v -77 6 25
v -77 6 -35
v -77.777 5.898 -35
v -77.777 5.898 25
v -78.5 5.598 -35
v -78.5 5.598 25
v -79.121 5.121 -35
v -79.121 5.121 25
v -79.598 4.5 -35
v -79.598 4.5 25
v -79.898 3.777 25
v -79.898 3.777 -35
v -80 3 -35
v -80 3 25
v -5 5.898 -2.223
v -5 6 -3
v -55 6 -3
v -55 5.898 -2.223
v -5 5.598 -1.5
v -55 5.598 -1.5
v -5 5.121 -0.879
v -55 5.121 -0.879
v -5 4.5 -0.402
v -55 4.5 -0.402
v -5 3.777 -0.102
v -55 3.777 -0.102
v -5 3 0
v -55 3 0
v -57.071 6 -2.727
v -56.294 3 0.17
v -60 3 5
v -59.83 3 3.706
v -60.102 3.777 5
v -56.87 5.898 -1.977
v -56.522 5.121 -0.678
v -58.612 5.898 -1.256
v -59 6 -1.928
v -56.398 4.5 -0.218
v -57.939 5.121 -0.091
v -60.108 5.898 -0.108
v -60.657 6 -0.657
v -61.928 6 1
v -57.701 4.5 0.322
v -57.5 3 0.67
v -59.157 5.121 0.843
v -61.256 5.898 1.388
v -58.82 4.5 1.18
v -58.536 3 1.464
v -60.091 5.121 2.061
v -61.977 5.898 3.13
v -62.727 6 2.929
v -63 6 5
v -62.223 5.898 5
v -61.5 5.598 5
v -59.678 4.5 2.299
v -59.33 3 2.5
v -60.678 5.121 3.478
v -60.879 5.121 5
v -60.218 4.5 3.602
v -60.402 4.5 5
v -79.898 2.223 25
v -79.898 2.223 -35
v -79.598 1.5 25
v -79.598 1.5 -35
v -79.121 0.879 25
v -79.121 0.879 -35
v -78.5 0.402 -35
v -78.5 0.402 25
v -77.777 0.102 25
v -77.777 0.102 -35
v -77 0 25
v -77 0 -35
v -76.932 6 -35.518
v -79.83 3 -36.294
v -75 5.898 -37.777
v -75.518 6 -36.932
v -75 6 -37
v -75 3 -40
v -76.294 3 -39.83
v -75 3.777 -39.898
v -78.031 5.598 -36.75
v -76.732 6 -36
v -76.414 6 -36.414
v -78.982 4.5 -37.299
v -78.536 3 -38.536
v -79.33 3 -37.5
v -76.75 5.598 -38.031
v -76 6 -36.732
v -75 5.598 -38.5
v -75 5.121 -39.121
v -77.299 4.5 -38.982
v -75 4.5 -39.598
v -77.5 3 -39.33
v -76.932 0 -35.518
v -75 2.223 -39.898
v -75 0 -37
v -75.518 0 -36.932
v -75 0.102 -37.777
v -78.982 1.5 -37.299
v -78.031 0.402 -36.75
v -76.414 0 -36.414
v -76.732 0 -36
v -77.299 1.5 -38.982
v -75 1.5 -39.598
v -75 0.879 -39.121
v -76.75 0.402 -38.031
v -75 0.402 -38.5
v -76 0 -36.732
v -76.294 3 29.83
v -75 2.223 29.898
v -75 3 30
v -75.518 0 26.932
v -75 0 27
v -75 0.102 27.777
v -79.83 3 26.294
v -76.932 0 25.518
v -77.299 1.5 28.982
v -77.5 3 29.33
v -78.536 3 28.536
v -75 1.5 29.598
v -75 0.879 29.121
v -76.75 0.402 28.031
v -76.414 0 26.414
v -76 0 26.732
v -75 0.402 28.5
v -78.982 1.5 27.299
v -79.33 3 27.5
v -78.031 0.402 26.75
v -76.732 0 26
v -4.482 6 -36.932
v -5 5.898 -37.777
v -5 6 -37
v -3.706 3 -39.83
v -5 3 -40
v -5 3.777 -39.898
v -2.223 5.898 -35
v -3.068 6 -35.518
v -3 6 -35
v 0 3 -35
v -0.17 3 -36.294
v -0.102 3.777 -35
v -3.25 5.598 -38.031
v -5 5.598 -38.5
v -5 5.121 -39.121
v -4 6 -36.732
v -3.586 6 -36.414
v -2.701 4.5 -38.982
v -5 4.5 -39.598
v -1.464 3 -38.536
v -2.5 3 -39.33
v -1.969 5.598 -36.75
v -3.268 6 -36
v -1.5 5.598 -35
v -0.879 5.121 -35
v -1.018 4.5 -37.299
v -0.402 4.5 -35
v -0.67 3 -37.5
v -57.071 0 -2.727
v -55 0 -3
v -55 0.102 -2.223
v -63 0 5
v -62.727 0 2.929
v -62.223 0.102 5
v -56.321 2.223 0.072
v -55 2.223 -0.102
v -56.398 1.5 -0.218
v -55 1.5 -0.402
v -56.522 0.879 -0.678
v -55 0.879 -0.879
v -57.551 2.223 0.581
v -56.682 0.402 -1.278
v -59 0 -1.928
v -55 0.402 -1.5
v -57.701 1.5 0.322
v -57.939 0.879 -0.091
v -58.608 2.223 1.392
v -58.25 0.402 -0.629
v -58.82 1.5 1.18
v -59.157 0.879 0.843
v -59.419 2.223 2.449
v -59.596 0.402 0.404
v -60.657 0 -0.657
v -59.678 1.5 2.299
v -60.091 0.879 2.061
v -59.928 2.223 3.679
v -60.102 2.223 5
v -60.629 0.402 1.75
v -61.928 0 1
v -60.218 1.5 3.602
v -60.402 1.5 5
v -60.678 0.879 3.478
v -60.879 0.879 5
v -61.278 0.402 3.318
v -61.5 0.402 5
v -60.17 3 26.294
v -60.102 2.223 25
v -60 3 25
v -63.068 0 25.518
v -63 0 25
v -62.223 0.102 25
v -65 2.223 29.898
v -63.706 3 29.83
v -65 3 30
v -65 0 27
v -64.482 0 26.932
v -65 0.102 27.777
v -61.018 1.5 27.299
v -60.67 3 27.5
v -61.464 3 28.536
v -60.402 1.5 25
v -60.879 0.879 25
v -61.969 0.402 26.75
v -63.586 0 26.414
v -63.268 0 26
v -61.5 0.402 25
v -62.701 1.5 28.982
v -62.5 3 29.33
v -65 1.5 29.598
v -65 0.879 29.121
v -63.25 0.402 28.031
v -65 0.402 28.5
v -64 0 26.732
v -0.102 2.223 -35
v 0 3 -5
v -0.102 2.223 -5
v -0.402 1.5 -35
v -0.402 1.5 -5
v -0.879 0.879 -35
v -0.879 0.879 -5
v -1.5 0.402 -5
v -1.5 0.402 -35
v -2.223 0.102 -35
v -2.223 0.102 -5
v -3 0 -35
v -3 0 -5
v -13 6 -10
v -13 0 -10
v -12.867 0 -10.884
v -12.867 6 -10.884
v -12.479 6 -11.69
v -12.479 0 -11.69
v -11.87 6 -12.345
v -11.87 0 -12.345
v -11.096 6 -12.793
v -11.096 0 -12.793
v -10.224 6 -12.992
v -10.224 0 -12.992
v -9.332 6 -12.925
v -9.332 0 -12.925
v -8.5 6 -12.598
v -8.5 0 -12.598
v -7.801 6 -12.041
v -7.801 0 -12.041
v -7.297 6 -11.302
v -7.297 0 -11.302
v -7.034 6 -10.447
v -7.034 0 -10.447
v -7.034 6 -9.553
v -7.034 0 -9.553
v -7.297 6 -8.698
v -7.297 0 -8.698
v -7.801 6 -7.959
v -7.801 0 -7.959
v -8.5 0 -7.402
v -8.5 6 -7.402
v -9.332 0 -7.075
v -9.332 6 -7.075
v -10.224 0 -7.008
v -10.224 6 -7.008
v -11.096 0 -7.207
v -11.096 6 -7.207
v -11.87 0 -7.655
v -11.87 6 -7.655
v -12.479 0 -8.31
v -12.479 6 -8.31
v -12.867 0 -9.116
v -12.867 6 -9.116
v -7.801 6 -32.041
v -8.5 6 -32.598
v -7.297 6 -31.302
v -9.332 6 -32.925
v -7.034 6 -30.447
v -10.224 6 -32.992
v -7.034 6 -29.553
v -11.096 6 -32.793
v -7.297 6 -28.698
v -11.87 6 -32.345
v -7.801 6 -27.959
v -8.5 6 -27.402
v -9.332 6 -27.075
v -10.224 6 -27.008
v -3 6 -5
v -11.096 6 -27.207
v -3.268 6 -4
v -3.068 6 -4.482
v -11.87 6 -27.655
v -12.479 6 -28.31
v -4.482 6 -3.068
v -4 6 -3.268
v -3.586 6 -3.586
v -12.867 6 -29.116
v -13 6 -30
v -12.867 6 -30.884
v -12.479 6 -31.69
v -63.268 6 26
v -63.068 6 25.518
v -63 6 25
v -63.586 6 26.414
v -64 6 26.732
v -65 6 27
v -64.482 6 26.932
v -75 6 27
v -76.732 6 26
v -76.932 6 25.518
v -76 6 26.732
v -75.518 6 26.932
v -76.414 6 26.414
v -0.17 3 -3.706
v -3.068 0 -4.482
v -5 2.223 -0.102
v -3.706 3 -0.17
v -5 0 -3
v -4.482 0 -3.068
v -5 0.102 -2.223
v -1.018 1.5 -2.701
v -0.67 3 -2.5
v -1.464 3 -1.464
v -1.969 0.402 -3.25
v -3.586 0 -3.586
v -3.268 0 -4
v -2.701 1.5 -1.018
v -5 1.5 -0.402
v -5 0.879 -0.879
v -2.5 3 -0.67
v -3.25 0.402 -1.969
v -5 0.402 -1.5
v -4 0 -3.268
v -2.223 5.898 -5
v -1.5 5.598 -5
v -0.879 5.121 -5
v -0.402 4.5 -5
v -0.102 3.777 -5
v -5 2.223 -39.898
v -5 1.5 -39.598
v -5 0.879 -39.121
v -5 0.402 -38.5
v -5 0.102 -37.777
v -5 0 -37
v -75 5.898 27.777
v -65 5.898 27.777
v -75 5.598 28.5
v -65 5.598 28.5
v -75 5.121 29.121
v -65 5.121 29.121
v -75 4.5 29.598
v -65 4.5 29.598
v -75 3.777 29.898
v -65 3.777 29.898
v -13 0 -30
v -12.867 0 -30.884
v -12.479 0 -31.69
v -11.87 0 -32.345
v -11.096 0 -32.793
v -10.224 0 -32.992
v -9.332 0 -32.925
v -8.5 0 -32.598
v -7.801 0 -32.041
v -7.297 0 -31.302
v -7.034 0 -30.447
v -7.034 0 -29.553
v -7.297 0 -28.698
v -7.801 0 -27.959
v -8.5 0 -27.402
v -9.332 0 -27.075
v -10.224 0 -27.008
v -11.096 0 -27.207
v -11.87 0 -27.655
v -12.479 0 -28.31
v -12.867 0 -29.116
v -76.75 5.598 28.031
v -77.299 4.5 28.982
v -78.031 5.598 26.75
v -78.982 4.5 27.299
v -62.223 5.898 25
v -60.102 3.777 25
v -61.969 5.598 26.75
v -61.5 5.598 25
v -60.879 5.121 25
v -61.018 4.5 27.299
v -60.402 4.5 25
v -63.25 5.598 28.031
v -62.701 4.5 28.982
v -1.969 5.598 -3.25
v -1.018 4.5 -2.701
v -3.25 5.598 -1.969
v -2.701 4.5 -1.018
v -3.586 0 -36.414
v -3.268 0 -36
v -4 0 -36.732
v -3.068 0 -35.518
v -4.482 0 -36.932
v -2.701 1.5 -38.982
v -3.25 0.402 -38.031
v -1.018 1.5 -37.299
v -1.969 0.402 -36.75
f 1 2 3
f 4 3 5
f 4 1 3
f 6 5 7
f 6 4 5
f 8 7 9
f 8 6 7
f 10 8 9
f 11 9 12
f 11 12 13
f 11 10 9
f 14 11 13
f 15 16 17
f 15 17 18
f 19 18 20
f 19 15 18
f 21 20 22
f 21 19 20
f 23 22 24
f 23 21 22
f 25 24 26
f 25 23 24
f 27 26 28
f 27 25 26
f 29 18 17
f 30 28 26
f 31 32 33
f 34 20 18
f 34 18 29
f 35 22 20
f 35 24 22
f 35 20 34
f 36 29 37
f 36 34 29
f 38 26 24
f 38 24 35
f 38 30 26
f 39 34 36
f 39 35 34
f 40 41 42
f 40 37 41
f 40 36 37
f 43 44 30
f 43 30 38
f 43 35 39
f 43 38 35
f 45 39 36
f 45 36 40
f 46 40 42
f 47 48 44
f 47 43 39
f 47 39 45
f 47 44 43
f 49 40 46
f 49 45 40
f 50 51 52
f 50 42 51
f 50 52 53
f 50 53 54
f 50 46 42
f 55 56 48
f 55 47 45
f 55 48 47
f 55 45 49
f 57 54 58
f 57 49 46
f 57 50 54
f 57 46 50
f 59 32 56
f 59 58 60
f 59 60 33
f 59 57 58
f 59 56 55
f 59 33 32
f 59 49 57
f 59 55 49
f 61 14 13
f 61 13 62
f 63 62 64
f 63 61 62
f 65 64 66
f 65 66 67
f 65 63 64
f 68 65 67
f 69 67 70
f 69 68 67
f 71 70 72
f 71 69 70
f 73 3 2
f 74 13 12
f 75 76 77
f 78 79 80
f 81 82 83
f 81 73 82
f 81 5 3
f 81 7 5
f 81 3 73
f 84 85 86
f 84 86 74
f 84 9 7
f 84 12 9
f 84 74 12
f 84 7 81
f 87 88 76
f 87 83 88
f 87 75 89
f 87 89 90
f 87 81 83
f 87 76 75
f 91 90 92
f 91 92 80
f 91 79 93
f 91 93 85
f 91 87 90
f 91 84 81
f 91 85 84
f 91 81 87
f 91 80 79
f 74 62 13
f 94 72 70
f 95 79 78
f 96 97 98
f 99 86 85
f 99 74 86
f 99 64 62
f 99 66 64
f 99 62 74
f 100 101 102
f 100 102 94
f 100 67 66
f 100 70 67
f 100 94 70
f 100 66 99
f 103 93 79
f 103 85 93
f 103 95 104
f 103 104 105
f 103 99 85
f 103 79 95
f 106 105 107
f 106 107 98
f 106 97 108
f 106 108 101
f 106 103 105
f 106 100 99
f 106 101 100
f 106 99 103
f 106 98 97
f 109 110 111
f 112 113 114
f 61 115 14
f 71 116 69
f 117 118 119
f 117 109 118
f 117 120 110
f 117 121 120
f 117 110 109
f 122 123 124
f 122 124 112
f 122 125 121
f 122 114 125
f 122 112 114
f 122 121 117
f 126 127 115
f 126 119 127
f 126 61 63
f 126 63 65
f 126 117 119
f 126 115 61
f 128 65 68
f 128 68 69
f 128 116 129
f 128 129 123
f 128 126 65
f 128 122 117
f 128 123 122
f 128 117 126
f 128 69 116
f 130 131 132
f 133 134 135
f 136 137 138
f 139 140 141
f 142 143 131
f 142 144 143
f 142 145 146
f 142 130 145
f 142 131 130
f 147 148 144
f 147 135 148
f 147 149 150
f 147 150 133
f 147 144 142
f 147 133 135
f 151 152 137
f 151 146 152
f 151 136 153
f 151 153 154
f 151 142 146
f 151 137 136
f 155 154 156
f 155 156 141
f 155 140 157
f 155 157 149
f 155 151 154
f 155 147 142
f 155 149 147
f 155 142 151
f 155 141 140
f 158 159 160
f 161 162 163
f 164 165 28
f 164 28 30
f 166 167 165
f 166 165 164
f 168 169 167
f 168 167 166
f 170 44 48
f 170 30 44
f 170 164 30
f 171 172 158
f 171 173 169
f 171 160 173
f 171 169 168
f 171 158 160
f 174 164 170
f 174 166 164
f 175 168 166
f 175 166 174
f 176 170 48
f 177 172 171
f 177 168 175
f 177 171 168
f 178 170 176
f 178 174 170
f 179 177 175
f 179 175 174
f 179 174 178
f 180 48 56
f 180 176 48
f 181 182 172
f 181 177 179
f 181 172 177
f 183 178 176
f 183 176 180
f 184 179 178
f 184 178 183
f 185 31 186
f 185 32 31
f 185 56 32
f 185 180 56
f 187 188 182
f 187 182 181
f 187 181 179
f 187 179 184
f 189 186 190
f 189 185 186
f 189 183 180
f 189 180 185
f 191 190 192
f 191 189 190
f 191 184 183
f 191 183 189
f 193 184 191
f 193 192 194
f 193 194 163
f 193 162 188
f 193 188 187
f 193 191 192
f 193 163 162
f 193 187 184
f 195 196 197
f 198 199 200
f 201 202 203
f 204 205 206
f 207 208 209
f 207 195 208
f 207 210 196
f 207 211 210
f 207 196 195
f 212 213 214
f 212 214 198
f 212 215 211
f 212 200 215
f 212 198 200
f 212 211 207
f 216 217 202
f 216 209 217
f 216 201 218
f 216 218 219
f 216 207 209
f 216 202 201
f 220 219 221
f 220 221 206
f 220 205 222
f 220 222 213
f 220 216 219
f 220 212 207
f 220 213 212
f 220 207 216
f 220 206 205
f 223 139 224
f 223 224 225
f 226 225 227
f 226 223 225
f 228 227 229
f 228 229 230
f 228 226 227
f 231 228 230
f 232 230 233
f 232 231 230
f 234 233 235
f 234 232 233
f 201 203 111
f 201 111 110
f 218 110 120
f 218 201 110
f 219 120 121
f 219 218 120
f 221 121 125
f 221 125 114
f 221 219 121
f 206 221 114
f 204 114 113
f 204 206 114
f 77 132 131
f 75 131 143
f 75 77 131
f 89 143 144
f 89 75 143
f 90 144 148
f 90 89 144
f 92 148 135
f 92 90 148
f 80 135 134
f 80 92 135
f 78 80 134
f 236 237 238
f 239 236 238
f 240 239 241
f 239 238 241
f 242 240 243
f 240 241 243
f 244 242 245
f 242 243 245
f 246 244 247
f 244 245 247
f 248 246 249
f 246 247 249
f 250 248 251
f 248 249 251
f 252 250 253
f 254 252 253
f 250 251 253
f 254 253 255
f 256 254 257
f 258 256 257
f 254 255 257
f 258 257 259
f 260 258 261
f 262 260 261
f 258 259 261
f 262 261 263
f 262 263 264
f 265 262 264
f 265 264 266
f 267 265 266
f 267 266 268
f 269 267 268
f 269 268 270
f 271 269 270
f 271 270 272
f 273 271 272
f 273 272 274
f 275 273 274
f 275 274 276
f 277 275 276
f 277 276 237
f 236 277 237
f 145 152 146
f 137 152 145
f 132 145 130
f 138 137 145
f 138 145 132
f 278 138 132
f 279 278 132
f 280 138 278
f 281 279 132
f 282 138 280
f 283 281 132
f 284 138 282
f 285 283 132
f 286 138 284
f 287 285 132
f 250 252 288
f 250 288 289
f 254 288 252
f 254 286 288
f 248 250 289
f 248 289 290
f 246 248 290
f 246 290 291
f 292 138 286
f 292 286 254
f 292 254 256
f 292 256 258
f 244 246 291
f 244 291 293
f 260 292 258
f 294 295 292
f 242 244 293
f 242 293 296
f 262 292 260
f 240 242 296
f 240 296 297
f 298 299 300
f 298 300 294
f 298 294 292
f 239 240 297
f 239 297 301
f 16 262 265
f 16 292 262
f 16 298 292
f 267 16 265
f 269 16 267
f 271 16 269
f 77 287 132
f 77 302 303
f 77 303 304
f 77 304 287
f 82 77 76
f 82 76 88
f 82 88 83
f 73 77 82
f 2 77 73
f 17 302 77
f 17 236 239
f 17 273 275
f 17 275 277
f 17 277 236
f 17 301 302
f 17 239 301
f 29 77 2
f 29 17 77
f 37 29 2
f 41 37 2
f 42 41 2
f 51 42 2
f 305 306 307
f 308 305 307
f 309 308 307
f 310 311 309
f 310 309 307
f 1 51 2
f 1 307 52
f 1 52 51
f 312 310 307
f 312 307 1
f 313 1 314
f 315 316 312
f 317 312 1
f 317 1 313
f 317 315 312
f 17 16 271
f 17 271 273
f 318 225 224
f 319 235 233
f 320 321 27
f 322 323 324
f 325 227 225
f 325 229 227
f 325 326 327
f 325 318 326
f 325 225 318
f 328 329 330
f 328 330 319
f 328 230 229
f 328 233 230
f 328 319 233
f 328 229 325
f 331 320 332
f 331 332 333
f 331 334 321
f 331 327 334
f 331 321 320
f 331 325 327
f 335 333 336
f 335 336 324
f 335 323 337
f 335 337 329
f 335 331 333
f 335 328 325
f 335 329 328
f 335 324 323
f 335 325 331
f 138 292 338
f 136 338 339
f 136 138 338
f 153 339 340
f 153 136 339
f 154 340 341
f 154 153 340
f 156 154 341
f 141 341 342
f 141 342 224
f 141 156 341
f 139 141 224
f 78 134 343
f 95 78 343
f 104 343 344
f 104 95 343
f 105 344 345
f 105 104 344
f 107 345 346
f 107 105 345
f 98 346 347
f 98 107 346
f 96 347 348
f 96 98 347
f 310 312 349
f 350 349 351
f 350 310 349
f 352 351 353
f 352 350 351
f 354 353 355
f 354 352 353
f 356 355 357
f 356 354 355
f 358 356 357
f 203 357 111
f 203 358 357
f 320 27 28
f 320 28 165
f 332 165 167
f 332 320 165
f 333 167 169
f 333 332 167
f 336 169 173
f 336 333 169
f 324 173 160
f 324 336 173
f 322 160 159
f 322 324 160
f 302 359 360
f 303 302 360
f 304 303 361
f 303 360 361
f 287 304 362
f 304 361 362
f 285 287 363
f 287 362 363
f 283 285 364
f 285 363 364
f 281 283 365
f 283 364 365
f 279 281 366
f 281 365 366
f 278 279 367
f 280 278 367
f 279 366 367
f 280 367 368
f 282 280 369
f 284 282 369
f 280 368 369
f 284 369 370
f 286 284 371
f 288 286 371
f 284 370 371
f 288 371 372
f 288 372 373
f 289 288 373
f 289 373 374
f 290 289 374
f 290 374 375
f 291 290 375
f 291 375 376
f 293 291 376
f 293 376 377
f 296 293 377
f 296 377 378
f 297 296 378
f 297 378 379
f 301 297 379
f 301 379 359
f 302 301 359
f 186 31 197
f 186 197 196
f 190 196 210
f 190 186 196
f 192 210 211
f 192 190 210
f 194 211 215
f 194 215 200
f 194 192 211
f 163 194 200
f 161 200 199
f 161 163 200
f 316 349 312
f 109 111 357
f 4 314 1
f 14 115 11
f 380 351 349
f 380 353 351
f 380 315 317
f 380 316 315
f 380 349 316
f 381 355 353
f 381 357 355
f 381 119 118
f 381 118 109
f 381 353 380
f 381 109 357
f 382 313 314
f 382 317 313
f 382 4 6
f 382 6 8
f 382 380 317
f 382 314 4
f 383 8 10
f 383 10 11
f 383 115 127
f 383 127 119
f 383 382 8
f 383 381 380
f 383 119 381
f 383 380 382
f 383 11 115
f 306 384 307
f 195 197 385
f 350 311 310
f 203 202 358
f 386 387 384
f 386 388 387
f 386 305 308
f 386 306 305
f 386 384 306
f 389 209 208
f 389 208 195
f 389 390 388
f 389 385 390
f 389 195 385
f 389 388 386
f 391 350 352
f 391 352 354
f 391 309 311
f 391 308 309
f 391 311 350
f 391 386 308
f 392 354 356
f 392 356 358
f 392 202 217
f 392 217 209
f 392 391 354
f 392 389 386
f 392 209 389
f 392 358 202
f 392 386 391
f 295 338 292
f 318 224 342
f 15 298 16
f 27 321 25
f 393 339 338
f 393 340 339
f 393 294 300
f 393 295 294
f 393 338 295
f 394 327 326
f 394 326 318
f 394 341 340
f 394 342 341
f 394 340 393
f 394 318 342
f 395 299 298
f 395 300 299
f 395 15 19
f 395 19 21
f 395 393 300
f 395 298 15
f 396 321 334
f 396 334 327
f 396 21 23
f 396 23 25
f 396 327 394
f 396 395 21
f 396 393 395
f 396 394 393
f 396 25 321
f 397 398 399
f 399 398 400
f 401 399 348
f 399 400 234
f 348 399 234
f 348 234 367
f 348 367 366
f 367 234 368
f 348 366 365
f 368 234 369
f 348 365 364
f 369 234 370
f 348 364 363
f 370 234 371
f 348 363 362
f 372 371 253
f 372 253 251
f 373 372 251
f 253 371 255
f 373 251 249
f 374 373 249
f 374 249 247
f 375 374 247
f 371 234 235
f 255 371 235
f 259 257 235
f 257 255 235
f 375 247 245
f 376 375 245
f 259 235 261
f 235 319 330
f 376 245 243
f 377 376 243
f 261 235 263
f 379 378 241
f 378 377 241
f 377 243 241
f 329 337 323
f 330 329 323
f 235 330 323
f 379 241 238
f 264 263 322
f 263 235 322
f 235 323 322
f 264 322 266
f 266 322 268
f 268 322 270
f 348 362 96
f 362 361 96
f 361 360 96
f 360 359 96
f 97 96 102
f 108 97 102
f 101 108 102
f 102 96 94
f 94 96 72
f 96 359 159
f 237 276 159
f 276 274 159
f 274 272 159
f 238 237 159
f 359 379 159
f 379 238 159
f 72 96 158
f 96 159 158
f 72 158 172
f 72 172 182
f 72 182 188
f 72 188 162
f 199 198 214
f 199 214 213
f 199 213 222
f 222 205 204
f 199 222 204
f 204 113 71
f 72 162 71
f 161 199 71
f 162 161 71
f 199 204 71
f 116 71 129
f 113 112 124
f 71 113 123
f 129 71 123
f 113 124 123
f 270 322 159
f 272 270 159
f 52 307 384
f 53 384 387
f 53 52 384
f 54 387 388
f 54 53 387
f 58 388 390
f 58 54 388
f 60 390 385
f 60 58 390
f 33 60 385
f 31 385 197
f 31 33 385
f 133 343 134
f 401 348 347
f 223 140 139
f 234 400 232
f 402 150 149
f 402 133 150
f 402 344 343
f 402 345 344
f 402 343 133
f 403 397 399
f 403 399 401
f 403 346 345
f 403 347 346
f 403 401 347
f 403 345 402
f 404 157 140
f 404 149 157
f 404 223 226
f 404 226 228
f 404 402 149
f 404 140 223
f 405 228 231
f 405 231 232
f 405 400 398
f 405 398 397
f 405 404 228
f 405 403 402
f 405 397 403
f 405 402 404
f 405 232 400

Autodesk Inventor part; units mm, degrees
ref_plane "YZ Plane" through (0, 0, 0) normal (1, 0, 0) x (0, 1, 0)
ref_plane "XZ Plane" through (0, 0, 0) normal (0, 1, 0) x (-1, 0, 0)
ref_plane "XY Plane" through (0, 0, 0) normal (0, 0, 1) x (1, 0, 0)
sketch "Sketch1" plane through (0, 0, 0) normal (0, 1, 0) x (-1, 0, 0)
  line L0 (0, 0) -> (80, 0)
  line L1 (80, 0) -> (80, -40)
  line L2 (80, -40) -> (0, -40)
  line L3 (0, -40) -> (0, 0)
  line L4 (0, 0) -> (10, 0)
  line L5 (10, 0) -> (10, -10)
  line L6 (10, -10) -> (10, -30)
  circle A0 centre (10, -10) radius 3
  circle A1 centre (10, -30) radius 3
  line L7 (80, 0) -> (60, 0)
  line L8 (60, 0) -> (60, 30)
  line L9 (60, 30) -> (80, 30)
  line L10 (80, 30) -> (80, 0)
  dimension "d0" = 80
  dimension "d1" = 40
  dimension "d2" = 10
  dimension "d3" = 10
  dimension "d4" = 20
  dimension "d5" = 6
  dimension "d6" = 6
  dimension "d28" = 20
  dimension "d29" = 30
extrude "Extrusion1" add sketch "Sketch1" along normal blind 6
fillet "Fillet5" radius 5 6 edges at (-60, 3, 0) (-60, 3, 30) (-80, 3, 30) (0, 3, 0) (0, 3, -40) (-80, 3, -40)
fillet "Fillet6" radius 3 24 edges at (-1.4645, 6, -1.4645) (0, 6, -20) (-1.4645, 6, -38.5355) (-40, 6, -40) (-78.5355, 6, -38.5355) (-80, 6, -5) (-78.5355, 6, 28.5355) (-70, 6, 30) (-61.4645, 6, 28.5355) (-60, 6, 15) (-58.5355, 6, 1.4645) (-30, 6, 0) (-1.4645, 0, -1.4645) (0, 0, -20) (-1.4645, 0, -38.5355) (-40, 0, -40) (-78.5355, 0, -38.5355) (-80, 0, -5) (-78.5355, 0, 28.5355) (-70, 0, 30) (-61.4645, 0, 28.5355) (-60, 0, 15) (-58.5355, 0, 1.4645) (-30, 0, 0)
properties part number "CableHook"
